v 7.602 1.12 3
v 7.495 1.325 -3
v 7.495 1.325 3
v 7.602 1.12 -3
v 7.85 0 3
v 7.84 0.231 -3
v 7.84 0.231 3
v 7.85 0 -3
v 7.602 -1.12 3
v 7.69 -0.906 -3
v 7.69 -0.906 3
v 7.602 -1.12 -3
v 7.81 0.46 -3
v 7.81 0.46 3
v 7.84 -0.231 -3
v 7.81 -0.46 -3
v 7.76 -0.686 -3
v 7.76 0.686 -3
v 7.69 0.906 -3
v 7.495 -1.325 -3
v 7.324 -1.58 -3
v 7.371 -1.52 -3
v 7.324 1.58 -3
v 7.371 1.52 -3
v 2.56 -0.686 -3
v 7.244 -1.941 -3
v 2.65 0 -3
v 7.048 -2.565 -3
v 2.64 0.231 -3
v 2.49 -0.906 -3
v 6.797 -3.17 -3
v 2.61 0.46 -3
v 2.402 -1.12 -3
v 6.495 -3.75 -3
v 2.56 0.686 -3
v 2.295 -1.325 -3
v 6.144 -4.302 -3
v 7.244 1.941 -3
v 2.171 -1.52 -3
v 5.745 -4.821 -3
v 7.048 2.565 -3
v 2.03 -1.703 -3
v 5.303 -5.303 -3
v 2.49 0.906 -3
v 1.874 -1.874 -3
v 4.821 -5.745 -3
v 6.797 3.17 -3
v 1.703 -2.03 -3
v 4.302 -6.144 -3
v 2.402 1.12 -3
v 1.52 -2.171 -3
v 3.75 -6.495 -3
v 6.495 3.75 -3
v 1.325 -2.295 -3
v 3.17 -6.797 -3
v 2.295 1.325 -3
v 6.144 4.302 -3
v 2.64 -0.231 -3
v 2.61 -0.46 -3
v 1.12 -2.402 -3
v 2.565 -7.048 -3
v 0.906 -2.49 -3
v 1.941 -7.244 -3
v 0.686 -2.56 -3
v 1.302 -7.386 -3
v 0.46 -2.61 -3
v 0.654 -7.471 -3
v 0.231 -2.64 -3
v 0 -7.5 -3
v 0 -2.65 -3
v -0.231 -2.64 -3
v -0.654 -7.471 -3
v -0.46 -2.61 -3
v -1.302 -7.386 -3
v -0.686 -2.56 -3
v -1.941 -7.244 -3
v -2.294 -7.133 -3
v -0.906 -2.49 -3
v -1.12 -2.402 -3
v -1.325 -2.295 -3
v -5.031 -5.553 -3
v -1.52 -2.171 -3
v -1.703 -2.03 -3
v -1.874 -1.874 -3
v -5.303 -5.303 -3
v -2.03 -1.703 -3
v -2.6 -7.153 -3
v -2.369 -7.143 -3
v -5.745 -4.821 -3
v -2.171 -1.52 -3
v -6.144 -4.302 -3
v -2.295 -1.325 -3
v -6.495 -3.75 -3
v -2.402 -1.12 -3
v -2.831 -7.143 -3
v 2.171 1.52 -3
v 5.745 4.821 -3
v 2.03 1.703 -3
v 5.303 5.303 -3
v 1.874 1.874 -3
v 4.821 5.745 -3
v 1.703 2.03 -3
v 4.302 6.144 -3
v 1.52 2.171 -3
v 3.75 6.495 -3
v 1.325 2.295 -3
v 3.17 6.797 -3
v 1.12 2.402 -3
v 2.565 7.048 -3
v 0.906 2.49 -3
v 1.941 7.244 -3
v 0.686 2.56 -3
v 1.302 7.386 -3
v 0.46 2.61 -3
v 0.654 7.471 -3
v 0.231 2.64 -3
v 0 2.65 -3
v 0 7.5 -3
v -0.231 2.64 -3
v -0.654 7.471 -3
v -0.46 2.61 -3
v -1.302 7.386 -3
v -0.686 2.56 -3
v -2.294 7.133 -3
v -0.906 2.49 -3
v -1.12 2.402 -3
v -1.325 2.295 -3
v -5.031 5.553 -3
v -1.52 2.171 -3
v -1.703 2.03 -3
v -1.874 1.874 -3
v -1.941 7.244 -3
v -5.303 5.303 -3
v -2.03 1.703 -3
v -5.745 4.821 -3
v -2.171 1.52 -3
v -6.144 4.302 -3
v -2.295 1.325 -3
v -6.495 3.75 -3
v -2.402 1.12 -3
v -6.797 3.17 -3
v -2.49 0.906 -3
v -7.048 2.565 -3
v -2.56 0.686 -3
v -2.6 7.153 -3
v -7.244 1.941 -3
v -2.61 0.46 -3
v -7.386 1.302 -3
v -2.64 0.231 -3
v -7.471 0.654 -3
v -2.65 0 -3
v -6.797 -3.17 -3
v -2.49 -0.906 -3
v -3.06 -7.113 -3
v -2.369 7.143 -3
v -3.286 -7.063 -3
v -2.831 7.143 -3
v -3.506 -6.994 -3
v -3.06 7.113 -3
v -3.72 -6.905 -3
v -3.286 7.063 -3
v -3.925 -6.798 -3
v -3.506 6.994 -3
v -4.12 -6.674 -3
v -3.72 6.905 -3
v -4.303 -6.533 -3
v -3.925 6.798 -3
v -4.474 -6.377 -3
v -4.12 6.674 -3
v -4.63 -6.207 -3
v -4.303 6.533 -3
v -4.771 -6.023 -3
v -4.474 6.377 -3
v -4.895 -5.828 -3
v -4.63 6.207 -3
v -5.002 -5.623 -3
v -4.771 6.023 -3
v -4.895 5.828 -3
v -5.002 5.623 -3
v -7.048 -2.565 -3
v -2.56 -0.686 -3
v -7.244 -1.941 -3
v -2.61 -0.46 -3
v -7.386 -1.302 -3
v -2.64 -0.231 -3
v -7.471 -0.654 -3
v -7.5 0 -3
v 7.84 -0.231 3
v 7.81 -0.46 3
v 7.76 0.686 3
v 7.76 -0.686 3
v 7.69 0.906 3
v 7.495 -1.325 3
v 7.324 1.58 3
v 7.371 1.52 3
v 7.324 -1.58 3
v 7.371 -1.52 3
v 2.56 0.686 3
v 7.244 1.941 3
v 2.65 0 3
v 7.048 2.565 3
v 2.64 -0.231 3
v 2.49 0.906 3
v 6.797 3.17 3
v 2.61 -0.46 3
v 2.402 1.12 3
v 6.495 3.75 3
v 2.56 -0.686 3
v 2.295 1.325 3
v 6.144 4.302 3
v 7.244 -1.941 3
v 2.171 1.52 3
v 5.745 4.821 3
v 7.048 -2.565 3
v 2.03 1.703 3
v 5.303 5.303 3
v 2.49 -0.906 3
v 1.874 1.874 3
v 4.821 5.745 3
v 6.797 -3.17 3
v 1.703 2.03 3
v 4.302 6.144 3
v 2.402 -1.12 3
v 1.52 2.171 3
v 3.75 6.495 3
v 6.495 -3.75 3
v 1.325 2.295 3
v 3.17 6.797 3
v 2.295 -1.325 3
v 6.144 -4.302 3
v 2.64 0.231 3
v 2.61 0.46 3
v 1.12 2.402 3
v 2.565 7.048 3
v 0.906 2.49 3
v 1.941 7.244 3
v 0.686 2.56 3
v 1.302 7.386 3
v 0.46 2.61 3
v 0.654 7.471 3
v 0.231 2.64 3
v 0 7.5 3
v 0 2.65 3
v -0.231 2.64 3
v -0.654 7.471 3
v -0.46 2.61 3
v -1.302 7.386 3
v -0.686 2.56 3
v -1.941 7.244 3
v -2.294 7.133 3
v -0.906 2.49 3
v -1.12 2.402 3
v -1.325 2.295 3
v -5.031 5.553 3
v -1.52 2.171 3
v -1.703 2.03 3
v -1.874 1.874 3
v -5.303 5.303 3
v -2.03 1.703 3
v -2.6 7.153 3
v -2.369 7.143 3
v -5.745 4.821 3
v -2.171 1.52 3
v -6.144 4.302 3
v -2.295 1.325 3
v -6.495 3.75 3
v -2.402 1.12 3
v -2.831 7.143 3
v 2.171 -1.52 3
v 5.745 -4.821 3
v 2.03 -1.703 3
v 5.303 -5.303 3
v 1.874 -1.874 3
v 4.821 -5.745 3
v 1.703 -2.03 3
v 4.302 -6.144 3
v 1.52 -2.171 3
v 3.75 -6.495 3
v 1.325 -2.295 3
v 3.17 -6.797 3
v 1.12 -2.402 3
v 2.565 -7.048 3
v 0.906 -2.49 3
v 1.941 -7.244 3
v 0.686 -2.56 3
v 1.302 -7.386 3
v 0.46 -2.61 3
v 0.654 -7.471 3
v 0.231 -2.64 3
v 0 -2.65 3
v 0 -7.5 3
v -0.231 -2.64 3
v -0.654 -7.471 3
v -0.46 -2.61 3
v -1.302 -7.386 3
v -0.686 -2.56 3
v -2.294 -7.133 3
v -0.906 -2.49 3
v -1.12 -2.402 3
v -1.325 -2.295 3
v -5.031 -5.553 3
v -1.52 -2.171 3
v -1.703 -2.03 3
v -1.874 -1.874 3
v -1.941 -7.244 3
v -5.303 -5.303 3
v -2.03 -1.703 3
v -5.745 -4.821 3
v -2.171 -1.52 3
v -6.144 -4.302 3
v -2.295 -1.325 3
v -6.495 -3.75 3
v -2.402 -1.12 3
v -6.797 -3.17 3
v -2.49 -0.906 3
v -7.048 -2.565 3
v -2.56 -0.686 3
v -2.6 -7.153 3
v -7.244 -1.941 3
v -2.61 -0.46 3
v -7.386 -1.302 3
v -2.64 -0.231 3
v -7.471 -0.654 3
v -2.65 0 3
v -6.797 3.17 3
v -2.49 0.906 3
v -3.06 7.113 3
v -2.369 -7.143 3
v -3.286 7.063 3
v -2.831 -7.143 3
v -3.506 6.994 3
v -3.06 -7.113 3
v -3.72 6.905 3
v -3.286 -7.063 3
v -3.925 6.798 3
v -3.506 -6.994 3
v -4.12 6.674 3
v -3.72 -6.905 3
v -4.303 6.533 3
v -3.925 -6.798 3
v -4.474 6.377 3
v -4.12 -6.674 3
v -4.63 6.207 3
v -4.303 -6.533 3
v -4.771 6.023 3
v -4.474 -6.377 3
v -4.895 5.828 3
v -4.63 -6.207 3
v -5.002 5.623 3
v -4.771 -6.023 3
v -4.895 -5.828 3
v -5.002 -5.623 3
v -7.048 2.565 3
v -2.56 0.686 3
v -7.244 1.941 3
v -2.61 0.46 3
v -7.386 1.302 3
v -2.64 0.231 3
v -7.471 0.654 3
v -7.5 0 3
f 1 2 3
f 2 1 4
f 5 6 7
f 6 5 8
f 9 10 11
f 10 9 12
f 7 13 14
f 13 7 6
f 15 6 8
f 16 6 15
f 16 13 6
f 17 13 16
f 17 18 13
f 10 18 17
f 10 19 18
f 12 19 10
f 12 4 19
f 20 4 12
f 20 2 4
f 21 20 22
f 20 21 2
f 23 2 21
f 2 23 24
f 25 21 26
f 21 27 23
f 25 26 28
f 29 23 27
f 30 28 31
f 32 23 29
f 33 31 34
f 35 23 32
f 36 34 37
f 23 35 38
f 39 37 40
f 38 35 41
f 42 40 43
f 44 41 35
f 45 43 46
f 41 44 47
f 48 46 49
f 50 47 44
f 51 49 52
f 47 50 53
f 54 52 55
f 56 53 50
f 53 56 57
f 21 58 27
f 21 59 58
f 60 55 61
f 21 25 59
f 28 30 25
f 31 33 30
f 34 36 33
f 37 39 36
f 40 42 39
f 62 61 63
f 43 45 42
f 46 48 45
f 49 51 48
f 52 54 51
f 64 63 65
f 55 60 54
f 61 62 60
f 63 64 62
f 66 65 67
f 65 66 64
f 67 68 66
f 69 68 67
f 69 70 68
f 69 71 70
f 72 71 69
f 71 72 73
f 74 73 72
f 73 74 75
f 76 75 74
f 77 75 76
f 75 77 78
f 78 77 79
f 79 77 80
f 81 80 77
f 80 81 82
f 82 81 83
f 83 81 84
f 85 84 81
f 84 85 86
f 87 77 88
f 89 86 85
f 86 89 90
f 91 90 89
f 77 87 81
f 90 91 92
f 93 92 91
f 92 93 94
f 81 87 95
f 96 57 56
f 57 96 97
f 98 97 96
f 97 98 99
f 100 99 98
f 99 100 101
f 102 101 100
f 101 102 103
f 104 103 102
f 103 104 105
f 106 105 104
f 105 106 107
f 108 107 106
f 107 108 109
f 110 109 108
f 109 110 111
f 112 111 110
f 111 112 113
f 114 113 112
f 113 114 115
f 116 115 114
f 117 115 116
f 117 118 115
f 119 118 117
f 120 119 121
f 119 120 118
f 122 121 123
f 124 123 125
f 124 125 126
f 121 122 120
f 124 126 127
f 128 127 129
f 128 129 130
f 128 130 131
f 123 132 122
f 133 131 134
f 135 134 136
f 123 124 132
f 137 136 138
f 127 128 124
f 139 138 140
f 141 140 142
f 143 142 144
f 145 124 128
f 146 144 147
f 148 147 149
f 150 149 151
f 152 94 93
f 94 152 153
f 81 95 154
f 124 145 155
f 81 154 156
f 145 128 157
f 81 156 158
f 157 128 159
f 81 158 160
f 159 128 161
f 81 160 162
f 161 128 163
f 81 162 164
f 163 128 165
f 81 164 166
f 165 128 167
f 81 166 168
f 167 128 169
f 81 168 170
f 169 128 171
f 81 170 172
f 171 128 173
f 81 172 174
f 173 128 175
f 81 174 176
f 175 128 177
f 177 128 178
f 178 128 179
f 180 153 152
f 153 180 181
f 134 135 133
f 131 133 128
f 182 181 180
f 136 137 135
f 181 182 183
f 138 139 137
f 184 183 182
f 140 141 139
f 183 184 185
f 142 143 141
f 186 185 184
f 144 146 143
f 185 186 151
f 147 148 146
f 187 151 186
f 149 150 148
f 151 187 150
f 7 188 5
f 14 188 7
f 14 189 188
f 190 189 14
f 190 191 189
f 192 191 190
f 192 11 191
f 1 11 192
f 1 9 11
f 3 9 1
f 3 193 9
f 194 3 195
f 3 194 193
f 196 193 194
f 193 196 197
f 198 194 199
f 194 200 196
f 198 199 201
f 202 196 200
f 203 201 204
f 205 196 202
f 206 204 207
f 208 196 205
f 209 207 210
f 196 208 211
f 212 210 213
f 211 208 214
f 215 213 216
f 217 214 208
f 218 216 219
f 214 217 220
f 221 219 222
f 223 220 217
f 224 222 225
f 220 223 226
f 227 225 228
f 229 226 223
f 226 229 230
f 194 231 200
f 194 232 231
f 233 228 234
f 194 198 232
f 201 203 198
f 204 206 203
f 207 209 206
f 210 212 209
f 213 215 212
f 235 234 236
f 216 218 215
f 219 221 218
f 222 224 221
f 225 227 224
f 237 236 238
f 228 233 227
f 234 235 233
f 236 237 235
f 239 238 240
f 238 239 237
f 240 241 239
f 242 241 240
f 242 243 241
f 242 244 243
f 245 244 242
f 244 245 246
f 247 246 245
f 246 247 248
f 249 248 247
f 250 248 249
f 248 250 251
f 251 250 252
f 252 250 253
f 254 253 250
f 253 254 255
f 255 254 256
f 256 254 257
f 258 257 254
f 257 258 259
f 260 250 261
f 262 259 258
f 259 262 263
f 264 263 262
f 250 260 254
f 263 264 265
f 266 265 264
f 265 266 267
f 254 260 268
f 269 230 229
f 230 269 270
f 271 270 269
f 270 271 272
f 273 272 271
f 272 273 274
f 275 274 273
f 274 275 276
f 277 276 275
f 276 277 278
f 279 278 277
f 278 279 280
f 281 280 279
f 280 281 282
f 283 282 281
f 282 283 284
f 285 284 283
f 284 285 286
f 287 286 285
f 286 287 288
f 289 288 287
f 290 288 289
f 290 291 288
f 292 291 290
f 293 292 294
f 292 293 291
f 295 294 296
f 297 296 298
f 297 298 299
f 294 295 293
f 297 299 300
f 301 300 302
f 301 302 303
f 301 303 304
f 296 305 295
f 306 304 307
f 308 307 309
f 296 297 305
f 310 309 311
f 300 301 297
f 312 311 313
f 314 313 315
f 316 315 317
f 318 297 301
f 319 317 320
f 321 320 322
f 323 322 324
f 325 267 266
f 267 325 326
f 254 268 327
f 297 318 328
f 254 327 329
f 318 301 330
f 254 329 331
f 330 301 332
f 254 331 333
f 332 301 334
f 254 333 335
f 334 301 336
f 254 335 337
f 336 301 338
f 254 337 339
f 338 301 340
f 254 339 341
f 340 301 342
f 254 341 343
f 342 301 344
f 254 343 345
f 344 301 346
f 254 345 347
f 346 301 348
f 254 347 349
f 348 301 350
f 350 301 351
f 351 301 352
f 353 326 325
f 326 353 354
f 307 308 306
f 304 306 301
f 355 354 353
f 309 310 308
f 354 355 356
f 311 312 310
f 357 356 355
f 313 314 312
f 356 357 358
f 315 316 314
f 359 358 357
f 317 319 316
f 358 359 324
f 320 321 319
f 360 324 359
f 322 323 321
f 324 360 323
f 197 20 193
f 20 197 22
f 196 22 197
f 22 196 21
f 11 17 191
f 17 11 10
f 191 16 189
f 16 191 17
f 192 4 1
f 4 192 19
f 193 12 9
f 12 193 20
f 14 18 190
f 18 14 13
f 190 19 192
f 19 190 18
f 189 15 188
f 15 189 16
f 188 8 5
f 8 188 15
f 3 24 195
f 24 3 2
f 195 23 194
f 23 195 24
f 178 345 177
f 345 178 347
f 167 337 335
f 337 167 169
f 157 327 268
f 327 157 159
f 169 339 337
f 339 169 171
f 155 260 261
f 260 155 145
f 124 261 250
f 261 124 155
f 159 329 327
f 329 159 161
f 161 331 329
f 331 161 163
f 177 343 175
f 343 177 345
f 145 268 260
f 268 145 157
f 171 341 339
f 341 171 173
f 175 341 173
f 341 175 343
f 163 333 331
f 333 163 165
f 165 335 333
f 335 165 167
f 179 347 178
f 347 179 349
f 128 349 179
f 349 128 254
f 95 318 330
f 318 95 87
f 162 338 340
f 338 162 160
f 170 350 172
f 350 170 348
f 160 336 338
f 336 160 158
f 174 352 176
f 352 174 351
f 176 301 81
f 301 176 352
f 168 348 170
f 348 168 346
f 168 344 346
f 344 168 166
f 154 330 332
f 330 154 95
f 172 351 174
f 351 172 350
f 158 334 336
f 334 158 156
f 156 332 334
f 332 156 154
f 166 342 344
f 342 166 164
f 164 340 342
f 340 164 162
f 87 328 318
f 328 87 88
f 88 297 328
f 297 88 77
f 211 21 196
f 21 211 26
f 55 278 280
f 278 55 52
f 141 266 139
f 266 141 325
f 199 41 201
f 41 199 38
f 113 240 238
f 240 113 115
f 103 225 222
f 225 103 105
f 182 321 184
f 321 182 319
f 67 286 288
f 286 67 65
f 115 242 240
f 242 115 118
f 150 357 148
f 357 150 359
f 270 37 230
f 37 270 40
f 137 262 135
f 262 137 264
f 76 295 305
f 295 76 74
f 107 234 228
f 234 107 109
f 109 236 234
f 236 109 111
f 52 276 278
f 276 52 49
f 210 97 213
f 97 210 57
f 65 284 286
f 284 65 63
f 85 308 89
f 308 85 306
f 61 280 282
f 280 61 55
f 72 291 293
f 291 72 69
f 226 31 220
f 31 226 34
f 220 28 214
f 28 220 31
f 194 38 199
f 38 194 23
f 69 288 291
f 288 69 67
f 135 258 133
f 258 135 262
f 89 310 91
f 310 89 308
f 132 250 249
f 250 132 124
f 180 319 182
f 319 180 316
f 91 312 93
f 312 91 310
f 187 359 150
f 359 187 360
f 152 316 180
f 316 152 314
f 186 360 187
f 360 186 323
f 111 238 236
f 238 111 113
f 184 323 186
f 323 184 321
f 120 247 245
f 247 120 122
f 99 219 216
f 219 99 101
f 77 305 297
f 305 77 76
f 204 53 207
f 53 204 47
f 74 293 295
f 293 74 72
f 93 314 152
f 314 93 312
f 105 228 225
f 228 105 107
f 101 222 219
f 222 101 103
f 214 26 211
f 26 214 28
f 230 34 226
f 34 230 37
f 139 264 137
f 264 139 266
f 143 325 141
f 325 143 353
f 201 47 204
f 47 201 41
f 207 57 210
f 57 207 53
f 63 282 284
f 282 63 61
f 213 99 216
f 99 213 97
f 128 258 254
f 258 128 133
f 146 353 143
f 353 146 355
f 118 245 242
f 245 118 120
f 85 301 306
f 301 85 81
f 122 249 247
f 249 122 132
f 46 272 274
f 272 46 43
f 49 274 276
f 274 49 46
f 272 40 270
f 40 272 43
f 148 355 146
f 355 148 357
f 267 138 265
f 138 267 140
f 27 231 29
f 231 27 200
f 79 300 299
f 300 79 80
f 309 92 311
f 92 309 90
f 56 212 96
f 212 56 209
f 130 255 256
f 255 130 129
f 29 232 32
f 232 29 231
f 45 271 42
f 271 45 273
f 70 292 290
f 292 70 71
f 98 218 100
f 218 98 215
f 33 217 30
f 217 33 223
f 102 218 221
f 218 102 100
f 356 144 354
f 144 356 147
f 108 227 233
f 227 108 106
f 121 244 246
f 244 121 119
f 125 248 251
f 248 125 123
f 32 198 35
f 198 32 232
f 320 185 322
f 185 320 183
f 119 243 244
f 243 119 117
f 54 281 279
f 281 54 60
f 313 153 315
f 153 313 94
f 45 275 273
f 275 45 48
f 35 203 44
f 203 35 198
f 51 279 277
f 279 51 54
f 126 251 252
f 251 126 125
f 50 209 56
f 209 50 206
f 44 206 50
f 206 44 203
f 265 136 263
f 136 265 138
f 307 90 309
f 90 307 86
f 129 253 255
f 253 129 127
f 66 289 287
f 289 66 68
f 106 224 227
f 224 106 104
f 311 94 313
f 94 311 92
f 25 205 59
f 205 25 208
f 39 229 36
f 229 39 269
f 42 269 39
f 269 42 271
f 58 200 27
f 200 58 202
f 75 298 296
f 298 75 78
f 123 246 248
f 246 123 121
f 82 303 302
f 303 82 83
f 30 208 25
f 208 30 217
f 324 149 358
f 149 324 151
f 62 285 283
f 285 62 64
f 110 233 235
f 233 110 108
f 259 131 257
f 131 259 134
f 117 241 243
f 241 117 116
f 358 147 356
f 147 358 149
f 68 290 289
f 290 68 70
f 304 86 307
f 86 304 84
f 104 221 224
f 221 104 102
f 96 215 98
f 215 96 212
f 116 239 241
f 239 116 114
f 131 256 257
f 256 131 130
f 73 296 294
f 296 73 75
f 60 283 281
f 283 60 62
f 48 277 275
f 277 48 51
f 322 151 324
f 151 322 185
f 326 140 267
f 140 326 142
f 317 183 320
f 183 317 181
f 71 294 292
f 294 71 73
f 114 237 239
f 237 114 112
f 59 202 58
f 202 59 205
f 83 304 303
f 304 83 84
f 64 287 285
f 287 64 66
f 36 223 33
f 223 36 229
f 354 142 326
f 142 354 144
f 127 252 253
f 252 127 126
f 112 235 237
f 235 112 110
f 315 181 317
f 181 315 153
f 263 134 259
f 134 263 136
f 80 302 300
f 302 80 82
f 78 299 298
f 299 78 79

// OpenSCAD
// K'NEX Green 3-Way Connector (120°)
$fn = 72;

hub_r = 7.5;
hub_h = 6.0;
arm_w = 5.3;
arm_h = 6.0;
arm_len = 12.7;
hole_r = 2.65;
slot_w = 1.2;

module arm() {
    difference() {
        hull() {
            cylinder(h=arm_h, r=arm_w/2, center=true);
            translate([arm_len - hub_r, 0, 0])
                cylinder(h=arm_h, r=arm_w/2, center=true);
        }
        translate([arm_len, 0, 0])
            cylinder(h=arm_h+2, r=hole_r, center=true);
        translate([arm_len, 0, 0]) {
            translate([0, 0, arm_h/2])
                cube([slot_w, hole_r*2+1, 2], center=true);
            translate([0, 0, -arm_h/2])
                cube([slot_w, hole_r*2+1, 2], center=true);
        }
    }
}

module connector_3way() {
    difference() {
        union() {
            cylinder(h=hub_h, r=hub_r, center=true);
            for (a = [0, 120, 240]) {
                rotate([0, 0, a]) arm();
            }
        }
        cylinder(h=hub_h+2, r=hole_r, center=true);
    }
}

connector_3way();
